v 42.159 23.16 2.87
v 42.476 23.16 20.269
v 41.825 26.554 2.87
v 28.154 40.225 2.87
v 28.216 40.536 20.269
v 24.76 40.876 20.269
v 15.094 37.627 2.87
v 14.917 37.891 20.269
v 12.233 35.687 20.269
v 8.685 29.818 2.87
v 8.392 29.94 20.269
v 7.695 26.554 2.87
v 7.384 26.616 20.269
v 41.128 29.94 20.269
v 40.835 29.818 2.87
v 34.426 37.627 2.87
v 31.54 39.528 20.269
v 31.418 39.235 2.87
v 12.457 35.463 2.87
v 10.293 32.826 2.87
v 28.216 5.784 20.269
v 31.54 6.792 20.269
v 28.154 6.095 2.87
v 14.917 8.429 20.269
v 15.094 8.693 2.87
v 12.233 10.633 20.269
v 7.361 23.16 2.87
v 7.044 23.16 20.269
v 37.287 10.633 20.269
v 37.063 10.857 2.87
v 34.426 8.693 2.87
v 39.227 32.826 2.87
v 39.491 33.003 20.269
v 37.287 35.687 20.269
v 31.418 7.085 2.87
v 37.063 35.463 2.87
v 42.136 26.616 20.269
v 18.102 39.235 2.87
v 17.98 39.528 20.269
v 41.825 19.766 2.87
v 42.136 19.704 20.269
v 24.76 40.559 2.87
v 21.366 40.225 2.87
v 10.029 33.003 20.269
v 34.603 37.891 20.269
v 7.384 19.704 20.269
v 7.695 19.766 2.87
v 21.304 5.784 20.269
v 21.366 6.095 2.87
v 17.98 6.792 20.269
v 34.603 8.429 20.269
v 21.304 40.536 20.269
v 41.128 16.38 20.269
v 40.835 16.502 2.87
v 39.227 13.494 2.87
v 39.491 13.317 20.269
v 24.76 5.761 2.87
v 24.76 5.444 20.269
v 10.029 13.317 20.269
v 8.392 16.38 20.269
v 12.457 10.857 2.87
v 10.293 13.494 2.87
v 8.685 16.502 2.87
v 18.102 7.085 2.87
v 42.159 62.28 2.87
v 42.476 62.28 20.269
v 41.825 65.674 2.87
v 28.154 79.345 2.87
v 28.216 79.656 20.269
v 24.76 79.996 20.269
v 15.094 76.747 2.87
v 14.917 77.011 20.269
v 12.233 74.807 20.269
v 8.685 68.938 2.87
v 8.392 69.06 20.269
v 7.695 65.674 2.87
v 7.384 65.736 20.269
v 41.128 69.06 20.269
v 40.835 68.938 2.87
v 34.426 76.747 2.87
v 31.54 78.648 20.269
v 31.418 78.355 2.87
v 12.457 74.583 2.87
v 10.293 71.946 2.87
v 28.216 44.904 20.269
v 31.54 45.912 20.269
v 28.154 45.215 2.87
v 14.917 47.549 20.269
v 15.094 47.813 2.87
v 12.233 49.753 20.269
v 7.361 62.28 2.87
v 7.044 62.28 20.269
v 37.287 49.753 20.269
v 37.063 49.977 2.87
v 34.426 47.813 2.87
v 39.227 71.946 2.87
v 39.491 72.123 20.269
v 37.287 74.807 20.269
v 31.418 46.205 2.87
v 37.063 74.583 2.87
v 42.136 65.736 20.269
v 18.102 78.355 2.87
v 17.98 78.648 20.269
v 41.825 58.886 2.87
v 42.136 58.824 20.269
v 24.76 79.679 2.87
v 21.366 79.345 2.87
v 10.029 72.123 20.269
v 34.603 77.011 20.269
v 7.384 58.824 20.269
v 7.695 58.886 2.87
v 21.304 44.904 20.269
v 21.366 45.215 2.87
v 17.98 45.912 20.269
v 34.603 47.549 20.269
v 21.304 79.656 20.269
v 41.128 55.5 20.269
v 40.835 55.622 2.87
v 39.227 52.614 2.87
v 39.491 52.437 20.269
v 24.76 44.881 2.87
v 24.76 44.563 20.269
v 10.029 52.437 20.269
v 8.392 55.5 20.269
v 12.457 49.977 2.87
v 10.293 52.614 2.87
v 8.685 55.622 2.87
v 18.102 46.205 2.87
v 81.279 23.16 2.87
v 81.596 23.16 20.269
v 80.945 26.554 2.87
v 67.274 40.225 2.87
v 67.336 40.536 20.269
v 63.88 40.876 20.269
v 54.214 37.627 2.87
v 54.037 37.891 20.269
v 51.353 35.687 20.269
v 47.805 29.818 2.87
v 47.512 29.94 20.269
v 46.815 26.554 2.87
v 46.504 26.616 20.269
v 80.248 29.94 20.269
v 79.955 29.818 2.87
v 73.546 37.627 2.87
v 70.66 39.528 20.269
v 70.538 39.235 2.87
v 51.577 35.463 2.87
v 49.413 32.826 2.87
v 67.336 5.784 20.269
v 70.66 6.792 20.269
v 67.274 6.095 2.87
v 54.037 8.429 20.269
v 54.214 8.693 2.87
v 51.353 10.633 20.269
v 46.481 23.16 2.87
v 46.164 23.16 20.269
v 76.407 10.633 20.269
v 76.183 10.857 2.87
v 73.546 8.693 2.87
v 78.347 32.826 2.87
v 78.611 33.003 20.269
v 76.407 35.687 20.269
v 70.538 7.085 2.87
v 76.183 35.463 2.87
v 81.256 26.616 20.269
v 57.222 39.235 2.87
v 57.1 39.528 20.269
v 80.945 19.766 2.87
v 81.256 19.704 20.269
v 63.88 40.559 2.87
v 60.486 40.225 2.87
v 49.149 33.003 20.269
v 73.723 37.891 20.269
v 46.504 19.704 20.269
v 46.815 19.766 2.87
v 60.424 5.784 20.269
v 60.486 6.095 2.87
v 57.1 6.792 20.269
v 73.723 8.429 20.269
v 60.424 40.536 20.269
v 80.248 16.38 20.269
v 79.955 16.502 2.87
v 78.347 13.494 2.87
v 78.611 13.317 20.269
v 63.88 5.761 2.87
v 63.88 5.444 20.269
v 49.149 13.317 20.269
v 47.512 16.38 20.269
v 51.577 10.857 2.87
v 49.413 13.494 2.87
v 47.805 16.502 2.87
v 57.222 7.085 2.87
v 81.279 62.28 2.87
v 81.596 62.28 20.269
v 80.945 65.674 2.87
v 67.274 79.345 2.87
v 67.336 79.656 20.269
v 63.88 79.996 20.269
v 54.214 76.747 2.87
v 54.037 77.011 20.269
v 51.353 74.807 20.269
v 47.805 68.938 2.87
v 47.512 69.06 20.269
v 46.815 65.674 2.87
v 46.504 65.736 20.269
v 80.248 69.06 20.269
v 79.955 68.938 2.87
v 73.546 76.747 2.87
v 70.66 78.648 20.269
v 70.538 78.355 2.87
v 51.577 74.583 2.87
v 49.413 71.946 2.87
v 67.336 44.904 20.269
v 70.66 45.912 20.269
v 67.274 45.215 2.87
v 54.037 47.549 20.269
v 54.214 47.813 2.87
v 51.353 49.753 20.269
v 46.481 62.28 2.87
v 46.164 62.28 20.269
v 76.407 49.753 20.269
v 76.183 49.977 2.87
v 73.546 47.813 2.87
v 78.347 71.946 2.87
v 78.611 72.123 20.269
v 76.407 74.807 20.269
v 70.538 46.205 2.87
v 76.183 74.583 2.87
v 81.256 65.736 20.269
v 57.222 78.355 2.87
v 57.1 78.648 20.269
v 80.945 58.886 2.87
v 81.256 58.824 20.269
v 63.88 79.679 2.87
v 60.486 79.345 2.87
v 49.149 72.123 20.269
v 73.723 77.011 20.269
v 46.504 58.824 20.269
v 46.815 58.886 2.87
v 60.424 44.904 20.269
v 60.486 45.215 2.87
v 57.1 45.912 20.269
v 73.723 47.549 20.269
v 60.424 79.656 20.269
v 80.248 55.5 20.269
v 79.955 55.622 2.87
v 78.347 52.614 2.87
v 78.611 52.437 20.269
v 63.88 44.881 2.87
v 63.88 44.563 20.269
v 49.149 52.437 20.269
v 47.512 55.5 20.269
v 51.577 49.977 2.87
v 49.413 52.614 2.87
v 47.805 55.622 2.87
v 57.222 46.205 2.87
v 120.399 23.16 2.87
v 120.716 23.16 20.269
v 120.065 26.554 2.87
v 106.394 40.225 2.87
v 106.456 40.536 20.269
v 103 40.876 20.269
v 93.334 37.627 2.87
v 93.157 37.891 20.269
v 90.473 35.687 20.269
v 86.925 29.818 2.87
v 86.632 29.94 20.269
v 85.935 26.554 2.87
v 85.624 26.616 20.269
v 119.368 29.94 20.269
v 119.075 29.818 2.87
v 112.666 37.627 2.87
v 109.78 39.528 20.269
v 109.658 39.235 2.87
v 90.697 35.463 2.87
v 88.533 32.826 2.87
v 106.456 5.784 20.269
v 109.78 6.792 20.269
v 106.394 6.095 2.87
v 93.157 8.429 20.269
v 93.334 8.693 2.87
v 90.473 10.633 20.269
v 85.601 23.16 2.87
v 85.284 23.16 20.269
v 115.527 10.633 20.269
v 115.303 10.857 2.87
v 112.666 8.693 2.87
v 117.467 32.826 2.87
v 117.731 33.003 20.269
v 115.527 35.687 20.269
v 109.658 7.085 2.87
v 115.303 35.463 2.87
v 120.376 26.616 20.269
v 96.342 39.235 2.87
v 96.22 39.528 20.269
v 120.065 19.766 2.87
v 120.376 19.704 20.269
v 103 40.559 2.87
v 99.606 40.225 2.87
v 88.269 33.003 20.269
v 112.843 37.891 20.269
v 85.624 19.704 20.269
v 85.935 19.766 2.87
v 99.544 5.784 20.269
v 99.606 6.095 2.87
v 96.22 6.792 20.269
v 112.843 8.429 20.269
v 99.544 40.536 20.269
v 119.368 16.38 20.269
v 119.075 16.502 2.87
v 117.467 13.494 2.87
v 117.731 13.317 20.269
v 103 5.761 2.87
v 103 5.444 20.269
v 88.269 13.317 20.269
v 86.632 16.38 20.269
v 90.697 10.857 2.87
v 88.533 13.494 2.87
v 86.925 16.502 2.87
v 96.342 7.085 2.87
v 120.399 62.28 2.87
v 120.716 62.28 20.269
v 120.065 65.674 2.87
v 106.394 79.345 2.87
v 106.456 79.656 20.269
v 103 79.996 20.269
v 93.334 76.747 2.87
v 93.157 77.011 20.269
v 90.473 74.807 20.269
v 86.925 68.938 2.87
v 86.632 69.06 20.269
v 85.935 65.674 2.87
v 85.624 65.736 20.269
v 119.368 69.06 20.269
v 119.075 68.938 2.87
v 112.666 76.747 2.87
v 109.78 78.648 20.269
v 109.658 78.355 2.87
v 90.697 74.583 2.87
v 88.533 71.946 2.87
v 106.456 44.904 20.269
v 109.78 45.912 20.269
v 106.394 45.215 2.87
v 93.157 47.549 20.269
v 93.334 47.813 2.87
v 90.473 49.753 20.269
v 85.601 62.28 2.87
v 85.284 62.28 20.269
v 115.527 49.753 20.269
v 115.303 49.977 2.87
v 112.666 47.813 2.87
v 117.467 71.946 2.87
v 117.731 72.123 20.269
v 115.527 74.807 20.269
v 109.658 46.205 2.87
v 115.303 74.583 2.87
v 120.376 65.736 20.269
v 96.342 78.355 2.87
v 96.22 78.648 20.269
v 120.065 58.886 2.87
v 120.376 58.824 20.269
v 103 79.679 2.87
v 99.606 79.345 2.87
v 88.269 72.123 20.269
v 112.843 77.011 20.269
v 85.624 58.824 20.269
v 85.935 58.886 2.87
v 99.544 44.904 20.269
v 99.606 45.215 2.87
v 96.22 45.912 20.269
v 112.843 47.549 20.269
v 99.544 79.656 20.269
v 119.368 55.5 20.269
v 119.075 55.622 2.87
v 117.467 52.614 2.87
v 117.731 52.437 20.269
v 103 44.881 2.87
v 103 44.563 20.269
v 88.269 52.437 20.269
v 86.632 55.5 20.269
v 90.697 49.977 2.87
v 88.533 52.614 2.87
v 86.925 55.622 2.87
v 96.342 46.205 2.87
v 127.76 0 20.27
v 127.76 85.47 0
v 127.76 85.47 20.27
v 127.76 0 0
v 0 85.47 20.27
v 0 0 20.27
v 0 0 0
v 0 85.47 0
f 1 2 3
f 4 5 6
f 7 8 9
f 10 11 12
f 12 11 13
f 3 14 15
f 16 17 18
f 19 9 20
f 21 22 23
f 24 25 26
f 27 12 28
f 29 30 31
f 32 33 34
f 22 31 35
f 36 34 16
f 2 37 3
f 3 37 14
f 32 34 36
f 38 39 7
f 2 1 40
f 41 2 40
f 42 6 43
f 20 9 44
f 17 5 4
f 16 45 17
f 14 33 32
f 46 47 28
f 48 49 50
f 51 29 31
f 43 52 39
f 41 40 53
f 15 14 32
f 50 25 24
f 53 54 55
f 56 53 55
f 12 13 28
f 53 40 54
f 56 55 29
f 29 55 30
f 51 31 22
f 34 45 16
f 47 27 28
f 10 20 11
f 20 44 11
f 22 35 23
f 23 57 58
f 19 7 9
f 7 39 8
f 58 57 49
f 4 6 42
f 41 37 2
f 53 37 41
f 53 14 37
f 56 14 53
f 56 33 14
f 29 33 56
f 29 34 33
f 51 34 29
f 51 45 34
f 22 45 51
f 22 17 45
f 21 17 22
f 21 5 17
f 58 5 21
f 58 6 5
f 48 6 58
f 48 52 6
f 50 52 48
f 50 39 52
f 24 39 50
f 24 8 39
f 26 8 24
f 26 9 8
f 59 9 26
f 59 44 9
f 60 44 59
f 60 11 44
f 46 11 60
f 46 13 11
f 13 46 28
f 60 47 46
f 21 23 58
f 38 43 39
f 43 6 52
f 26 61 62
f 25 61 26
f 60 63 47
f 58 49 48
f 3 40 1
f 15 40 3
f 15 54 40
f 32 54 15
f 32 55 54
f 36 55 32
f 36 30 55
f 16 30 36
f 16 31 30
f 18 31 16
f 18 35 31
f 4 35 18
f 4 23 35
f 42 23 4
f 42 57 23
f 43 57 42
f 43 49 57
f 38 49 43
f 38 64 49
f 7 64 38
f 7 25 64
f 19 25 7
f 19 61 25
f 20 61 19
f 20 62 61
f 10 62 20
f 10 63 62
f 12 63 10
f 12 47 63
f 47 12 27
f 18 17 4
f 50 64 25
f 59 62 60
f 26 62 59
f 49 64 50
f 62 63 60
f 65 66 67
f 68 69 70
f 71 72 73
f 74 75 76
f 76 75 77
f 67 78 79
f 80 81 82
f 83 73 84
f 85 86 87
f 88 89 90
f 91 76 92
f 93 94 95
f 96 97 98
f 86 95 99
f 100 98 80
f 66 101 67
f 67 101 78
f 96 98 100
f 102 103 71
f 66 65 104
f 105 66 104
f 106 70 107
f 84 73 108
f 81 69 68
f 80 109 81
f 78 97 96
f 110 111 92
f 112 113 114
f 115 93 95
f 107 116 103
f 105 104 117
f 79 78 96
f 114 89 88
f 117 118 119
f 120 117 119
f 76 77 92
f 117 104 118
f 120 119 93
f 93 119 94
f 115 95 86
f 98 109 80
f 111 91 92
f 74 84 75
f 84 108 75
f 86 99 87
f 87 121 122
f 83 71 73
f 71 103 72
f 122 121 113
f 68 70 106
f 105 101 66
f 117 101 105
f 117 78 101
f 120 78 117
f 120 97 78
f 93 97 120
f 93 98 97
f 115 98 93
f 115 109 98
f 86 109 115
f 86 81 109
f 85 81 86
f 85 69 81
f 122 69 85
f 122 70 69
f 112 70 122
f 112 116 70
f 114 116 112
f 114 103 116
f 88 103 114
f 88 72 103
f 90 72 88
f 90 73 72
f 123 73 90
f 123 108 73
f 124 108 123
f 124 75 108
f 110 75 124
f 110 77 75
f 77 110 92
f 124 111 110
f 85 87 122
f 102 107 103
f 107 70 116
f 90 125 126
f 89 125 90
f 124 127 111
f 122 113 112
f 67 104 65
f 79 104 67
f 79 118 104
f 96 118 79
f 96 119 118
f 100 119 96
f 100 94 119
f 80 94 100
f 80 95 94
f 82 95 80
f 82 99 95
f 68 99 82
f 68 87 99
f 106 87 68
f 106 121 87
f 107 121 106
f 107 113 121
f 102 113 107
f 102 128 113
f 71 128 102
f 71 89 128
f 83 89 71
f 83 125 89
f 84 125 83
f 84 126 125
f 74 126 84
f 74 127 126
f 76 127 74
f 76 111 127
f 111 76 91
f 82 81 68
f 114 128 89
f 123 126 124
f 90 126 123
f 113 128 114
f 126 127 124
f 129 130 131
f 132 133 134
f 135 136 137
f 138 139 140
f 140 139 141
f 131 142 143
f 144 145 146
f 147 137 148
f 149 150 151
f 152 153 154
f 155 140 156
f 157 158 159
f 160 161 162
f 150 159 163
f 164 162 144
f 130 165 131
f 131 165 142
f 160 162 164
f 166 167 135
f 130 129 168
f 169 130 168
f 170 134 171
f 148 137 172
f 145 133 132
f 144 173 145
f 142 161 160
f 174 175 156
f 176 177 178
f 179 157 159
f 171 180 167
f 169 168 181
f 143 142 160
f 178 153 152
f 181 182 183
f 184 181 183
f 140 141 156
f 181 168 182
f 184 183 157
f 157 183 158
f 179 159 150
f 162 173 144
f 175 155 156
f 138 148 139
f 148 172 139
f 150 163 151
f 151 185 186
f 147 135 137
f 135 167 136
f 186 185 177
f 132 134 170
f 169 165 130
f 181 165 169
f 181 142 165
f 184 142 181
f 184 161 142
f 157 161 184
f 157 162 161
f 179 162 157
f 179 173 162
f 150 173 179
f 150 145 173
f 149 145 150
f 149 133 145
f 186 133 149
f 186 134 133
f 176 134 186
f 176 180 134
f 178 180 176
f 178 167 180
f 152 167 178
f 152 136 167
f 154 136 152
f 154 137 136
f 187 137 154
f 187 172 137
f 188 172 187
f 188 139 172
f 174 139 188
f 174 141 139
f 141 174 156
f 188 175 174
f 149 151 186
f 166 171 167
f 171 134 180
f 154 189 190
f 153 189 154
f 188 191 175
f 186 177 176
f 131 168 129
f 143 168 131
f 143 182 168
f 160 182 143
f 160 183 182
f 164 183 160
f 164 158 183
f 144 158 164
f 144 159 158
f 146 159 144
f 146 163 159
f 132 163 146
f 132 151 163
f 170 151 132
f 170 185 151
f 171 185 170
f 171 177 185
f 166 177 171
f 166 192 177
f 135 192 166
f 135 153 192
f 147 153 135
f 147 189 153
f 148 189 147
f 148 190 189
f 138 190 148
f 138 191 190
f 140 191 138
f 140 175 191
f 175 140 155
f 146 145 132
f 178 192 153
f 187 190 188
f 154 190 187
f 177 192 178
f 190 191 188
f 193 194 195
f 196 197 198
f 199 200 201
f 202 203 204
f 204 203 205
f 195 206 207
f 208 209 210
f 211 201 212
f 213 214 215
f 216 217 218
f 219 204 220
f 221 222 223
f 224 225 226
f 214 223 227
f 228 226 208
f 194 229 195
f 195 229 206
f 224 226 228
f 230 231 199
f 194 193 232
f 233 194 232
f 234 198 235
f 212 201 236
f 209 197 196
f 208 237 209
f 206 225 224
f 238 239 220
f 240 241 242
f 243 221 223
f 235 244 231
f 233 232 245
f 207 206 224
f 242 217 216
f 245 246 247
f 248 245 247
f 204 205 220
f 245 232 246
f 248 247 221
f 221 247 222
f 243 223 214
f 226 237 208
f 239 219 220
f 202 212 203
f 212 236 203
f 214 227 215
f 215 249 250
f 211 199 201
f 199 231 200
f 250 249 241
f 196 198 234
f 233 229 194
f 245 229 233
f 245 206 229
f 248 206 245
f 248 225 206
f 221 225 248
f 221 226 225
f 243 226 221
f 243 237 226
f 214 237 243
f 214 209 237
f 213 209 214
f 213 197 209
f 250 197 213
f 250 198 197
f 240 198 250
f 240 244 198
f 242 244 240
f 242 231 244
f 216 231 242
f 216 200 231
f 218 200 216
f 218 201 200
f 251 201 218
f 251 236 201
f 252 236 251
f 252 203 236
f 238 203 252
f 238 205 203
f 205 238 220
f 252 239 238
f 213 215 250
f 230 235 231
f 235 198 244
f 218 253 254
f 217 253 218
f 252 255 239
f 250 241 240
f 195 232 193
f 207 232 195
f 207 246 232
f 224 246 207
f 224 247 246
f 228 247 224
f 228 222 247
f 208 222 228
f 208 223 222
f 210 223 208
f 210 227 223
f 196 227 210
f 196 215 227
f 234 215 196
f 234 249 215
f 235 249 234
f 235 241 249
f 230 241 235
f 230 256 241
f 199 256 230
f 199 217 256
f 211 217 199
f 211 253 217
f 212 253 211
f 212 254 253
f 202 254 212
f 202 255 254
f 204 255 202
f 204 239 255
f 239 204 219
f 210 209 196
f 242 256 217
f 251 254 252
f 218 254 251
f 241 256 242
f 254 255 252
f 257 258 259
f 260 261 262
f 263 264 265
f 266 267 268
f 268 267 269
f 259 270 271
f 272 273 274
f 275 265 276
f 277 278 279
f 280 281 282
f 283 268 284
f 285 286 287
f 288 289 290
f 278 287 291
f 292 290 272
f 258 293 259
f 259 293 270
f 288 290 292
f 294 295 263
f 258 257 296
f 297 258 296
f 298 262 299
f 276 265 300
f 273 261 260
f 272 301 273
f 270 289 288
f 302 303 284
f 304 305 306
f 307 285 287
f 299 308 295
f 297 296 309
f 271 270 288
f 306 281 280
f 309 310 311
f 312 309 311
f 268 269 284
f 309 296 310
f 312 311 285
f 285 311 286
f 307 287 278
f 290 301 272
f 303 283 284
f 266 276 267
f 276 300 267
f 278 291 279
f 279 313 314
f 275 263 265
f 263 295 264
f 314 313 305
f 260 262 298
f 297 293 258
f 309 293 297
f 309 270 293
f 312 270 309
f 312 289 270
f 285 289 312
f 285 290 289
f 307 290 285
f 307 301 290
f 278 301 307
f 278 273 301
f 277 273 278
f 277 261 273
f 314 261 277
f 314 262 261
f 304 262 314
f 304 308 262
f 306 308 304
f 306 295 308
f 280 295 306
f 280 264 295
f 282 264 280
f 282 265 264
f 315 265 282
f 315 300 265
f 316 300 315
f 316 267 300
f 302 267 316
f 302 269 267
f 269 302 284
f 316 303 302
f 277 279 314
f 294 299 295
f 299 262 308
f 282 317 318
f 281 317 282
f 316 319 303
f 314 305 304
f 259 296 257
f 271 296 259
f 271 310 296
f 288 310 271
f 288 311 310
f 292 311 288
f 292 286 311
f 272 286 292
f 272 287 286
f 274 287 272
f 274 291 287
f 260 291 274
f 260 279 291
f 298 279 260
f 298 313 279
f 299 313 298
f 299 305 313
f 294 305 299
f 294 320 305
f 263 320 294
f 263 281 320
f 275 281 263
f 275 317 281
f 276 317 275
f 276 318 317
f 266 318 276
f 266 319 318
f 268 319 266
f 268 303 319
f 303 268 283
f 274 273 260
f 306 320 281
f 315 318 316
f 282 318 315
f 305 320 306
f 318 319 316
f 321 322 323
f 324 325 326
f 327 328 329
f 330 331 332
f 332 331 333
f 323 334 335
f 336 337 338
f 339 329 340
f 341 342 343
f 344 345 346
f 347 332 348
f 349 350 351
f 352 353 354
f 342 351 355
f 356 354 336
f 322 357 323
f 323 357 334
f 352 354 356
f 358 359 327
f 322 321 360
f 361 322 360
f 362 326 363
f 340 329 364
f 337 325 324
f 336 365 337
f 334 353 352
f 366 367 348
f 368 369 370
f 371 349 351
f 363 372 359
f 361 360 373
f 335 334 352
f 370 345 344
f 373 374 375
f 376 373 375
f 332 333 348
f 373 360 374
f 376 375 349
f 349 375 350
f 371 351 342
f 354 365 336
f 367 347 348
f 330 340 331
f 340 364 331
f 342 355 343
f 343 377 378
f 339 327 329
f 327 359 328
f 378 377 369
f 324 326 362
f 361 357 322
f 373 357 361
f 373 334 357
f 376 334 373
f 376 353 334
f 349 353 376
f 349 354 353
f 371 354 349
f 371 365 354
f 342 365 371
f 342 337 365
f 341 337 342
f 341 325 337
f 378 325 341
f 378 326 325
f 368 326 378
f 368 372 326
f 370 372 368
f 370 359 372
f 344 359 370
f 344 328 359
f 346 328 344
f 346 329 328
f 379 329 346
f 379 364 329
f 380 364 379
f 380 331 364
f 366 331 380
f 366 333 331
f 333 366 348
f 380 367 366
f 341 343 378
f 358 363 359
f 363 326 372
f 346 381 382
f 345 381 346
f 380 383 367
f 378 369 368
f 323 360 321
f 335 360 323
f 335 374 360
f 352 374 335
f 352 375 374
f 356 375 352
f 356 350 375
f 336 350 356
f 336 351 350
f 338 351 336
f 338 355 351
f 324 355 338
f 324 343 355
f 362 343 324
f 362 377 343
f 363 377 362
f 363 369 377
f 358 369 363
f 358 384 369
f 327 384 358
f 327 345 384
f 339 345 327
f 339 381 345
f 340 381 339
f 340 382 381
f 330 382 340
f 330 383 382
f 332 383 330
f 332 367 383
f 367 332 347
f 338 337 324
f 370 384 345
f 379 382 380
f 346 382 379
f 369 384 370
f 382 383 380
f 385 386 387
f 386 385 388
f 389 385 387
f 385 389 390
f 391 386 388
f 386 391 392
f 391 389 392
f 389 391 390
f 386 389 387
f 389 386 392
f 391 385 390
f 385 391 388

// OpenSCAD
// Corning 6 Well Plate 16.8 mL Flat
// loadName: corning_6_wellplate_16.8ml_flat
// Auto-generated by labware_to_stl.py from Opentrons V2 labware definition

$fn = 32;

difference() {
    // ── Labware body ──────────────────────────────────────────────
    cube([127.7600, 85.4700, 20.2700]);

    // ── Well cutouts ──────────────────────────────────────────────
    // Well B1
    translate([24.7600, 23.1600, 2.8700]) union() {
        translate([0, 0, 0.0000])
            cylinder(h=17.3990, r1=17.3990, r2=17.7165, $fn=$fn);
        translate([0, 0, 17.4000])
            cylinder(h=1, r=17.7165, $fn=$fn);
    }
    // Well A1
    translate([24.7600, 62.2800, 2.8700]) union() {
        translate([0, 0, 0.0000])
            cylinder(h=17.3990, r1=17.3990, r2=17.7165, $fn=$fn);
        translate([0, 0, 17.4000])
            cylinder(h=1, r=17.7165, $fn=$fn);
    }
    // Well B2
    translate([63.8800, 23.1600, 2.8700]) union() {
        translate([0, 0, 0.0000])
            cylinder(h=17.3990, r1=17.3990, r2=17.7165, $fn=$fn);
        translate([0, 0, 17.4000])
            cylinder(h=1, r=17.7165, $fn=$fn);
    }
    // Well A2
    translate([63.8800, 62.2800, 2.8700]) union() {
        translate([0, 0, 0.0000])
            cylinder(h=17.3990, r1=17.3990, r2=17.7165, $fn=$fn);
        translate([0, 0, 17.4000])
            cylinder(h=1, r=17.7165, $fn=$fn);
    }
    // Well B3
    translate([103.0000, 23.1600, 2.8700]) union() {
        translate([0, 0, 0.0000])
            cylinder(h=17.3990, r1=17.3990, r2=17.7165, $fn=$fn);
        translate([0, 0, 17.4000])
            cylinder(h=1, r=17.7165, $fn=$fn);
    }
    // Well A3
    translate([103.0000, 62.2800, 2.8700]) union() {
        translate([0, 0, 0.0000])
            cylinder(h=17.3990, r1=17.3990, r2=17.7165, $fn=$fn);
        translate([0, 0, 17.4000])
            cylinder(h=1, r=17.7165, $fn=$fn);
    }
}
